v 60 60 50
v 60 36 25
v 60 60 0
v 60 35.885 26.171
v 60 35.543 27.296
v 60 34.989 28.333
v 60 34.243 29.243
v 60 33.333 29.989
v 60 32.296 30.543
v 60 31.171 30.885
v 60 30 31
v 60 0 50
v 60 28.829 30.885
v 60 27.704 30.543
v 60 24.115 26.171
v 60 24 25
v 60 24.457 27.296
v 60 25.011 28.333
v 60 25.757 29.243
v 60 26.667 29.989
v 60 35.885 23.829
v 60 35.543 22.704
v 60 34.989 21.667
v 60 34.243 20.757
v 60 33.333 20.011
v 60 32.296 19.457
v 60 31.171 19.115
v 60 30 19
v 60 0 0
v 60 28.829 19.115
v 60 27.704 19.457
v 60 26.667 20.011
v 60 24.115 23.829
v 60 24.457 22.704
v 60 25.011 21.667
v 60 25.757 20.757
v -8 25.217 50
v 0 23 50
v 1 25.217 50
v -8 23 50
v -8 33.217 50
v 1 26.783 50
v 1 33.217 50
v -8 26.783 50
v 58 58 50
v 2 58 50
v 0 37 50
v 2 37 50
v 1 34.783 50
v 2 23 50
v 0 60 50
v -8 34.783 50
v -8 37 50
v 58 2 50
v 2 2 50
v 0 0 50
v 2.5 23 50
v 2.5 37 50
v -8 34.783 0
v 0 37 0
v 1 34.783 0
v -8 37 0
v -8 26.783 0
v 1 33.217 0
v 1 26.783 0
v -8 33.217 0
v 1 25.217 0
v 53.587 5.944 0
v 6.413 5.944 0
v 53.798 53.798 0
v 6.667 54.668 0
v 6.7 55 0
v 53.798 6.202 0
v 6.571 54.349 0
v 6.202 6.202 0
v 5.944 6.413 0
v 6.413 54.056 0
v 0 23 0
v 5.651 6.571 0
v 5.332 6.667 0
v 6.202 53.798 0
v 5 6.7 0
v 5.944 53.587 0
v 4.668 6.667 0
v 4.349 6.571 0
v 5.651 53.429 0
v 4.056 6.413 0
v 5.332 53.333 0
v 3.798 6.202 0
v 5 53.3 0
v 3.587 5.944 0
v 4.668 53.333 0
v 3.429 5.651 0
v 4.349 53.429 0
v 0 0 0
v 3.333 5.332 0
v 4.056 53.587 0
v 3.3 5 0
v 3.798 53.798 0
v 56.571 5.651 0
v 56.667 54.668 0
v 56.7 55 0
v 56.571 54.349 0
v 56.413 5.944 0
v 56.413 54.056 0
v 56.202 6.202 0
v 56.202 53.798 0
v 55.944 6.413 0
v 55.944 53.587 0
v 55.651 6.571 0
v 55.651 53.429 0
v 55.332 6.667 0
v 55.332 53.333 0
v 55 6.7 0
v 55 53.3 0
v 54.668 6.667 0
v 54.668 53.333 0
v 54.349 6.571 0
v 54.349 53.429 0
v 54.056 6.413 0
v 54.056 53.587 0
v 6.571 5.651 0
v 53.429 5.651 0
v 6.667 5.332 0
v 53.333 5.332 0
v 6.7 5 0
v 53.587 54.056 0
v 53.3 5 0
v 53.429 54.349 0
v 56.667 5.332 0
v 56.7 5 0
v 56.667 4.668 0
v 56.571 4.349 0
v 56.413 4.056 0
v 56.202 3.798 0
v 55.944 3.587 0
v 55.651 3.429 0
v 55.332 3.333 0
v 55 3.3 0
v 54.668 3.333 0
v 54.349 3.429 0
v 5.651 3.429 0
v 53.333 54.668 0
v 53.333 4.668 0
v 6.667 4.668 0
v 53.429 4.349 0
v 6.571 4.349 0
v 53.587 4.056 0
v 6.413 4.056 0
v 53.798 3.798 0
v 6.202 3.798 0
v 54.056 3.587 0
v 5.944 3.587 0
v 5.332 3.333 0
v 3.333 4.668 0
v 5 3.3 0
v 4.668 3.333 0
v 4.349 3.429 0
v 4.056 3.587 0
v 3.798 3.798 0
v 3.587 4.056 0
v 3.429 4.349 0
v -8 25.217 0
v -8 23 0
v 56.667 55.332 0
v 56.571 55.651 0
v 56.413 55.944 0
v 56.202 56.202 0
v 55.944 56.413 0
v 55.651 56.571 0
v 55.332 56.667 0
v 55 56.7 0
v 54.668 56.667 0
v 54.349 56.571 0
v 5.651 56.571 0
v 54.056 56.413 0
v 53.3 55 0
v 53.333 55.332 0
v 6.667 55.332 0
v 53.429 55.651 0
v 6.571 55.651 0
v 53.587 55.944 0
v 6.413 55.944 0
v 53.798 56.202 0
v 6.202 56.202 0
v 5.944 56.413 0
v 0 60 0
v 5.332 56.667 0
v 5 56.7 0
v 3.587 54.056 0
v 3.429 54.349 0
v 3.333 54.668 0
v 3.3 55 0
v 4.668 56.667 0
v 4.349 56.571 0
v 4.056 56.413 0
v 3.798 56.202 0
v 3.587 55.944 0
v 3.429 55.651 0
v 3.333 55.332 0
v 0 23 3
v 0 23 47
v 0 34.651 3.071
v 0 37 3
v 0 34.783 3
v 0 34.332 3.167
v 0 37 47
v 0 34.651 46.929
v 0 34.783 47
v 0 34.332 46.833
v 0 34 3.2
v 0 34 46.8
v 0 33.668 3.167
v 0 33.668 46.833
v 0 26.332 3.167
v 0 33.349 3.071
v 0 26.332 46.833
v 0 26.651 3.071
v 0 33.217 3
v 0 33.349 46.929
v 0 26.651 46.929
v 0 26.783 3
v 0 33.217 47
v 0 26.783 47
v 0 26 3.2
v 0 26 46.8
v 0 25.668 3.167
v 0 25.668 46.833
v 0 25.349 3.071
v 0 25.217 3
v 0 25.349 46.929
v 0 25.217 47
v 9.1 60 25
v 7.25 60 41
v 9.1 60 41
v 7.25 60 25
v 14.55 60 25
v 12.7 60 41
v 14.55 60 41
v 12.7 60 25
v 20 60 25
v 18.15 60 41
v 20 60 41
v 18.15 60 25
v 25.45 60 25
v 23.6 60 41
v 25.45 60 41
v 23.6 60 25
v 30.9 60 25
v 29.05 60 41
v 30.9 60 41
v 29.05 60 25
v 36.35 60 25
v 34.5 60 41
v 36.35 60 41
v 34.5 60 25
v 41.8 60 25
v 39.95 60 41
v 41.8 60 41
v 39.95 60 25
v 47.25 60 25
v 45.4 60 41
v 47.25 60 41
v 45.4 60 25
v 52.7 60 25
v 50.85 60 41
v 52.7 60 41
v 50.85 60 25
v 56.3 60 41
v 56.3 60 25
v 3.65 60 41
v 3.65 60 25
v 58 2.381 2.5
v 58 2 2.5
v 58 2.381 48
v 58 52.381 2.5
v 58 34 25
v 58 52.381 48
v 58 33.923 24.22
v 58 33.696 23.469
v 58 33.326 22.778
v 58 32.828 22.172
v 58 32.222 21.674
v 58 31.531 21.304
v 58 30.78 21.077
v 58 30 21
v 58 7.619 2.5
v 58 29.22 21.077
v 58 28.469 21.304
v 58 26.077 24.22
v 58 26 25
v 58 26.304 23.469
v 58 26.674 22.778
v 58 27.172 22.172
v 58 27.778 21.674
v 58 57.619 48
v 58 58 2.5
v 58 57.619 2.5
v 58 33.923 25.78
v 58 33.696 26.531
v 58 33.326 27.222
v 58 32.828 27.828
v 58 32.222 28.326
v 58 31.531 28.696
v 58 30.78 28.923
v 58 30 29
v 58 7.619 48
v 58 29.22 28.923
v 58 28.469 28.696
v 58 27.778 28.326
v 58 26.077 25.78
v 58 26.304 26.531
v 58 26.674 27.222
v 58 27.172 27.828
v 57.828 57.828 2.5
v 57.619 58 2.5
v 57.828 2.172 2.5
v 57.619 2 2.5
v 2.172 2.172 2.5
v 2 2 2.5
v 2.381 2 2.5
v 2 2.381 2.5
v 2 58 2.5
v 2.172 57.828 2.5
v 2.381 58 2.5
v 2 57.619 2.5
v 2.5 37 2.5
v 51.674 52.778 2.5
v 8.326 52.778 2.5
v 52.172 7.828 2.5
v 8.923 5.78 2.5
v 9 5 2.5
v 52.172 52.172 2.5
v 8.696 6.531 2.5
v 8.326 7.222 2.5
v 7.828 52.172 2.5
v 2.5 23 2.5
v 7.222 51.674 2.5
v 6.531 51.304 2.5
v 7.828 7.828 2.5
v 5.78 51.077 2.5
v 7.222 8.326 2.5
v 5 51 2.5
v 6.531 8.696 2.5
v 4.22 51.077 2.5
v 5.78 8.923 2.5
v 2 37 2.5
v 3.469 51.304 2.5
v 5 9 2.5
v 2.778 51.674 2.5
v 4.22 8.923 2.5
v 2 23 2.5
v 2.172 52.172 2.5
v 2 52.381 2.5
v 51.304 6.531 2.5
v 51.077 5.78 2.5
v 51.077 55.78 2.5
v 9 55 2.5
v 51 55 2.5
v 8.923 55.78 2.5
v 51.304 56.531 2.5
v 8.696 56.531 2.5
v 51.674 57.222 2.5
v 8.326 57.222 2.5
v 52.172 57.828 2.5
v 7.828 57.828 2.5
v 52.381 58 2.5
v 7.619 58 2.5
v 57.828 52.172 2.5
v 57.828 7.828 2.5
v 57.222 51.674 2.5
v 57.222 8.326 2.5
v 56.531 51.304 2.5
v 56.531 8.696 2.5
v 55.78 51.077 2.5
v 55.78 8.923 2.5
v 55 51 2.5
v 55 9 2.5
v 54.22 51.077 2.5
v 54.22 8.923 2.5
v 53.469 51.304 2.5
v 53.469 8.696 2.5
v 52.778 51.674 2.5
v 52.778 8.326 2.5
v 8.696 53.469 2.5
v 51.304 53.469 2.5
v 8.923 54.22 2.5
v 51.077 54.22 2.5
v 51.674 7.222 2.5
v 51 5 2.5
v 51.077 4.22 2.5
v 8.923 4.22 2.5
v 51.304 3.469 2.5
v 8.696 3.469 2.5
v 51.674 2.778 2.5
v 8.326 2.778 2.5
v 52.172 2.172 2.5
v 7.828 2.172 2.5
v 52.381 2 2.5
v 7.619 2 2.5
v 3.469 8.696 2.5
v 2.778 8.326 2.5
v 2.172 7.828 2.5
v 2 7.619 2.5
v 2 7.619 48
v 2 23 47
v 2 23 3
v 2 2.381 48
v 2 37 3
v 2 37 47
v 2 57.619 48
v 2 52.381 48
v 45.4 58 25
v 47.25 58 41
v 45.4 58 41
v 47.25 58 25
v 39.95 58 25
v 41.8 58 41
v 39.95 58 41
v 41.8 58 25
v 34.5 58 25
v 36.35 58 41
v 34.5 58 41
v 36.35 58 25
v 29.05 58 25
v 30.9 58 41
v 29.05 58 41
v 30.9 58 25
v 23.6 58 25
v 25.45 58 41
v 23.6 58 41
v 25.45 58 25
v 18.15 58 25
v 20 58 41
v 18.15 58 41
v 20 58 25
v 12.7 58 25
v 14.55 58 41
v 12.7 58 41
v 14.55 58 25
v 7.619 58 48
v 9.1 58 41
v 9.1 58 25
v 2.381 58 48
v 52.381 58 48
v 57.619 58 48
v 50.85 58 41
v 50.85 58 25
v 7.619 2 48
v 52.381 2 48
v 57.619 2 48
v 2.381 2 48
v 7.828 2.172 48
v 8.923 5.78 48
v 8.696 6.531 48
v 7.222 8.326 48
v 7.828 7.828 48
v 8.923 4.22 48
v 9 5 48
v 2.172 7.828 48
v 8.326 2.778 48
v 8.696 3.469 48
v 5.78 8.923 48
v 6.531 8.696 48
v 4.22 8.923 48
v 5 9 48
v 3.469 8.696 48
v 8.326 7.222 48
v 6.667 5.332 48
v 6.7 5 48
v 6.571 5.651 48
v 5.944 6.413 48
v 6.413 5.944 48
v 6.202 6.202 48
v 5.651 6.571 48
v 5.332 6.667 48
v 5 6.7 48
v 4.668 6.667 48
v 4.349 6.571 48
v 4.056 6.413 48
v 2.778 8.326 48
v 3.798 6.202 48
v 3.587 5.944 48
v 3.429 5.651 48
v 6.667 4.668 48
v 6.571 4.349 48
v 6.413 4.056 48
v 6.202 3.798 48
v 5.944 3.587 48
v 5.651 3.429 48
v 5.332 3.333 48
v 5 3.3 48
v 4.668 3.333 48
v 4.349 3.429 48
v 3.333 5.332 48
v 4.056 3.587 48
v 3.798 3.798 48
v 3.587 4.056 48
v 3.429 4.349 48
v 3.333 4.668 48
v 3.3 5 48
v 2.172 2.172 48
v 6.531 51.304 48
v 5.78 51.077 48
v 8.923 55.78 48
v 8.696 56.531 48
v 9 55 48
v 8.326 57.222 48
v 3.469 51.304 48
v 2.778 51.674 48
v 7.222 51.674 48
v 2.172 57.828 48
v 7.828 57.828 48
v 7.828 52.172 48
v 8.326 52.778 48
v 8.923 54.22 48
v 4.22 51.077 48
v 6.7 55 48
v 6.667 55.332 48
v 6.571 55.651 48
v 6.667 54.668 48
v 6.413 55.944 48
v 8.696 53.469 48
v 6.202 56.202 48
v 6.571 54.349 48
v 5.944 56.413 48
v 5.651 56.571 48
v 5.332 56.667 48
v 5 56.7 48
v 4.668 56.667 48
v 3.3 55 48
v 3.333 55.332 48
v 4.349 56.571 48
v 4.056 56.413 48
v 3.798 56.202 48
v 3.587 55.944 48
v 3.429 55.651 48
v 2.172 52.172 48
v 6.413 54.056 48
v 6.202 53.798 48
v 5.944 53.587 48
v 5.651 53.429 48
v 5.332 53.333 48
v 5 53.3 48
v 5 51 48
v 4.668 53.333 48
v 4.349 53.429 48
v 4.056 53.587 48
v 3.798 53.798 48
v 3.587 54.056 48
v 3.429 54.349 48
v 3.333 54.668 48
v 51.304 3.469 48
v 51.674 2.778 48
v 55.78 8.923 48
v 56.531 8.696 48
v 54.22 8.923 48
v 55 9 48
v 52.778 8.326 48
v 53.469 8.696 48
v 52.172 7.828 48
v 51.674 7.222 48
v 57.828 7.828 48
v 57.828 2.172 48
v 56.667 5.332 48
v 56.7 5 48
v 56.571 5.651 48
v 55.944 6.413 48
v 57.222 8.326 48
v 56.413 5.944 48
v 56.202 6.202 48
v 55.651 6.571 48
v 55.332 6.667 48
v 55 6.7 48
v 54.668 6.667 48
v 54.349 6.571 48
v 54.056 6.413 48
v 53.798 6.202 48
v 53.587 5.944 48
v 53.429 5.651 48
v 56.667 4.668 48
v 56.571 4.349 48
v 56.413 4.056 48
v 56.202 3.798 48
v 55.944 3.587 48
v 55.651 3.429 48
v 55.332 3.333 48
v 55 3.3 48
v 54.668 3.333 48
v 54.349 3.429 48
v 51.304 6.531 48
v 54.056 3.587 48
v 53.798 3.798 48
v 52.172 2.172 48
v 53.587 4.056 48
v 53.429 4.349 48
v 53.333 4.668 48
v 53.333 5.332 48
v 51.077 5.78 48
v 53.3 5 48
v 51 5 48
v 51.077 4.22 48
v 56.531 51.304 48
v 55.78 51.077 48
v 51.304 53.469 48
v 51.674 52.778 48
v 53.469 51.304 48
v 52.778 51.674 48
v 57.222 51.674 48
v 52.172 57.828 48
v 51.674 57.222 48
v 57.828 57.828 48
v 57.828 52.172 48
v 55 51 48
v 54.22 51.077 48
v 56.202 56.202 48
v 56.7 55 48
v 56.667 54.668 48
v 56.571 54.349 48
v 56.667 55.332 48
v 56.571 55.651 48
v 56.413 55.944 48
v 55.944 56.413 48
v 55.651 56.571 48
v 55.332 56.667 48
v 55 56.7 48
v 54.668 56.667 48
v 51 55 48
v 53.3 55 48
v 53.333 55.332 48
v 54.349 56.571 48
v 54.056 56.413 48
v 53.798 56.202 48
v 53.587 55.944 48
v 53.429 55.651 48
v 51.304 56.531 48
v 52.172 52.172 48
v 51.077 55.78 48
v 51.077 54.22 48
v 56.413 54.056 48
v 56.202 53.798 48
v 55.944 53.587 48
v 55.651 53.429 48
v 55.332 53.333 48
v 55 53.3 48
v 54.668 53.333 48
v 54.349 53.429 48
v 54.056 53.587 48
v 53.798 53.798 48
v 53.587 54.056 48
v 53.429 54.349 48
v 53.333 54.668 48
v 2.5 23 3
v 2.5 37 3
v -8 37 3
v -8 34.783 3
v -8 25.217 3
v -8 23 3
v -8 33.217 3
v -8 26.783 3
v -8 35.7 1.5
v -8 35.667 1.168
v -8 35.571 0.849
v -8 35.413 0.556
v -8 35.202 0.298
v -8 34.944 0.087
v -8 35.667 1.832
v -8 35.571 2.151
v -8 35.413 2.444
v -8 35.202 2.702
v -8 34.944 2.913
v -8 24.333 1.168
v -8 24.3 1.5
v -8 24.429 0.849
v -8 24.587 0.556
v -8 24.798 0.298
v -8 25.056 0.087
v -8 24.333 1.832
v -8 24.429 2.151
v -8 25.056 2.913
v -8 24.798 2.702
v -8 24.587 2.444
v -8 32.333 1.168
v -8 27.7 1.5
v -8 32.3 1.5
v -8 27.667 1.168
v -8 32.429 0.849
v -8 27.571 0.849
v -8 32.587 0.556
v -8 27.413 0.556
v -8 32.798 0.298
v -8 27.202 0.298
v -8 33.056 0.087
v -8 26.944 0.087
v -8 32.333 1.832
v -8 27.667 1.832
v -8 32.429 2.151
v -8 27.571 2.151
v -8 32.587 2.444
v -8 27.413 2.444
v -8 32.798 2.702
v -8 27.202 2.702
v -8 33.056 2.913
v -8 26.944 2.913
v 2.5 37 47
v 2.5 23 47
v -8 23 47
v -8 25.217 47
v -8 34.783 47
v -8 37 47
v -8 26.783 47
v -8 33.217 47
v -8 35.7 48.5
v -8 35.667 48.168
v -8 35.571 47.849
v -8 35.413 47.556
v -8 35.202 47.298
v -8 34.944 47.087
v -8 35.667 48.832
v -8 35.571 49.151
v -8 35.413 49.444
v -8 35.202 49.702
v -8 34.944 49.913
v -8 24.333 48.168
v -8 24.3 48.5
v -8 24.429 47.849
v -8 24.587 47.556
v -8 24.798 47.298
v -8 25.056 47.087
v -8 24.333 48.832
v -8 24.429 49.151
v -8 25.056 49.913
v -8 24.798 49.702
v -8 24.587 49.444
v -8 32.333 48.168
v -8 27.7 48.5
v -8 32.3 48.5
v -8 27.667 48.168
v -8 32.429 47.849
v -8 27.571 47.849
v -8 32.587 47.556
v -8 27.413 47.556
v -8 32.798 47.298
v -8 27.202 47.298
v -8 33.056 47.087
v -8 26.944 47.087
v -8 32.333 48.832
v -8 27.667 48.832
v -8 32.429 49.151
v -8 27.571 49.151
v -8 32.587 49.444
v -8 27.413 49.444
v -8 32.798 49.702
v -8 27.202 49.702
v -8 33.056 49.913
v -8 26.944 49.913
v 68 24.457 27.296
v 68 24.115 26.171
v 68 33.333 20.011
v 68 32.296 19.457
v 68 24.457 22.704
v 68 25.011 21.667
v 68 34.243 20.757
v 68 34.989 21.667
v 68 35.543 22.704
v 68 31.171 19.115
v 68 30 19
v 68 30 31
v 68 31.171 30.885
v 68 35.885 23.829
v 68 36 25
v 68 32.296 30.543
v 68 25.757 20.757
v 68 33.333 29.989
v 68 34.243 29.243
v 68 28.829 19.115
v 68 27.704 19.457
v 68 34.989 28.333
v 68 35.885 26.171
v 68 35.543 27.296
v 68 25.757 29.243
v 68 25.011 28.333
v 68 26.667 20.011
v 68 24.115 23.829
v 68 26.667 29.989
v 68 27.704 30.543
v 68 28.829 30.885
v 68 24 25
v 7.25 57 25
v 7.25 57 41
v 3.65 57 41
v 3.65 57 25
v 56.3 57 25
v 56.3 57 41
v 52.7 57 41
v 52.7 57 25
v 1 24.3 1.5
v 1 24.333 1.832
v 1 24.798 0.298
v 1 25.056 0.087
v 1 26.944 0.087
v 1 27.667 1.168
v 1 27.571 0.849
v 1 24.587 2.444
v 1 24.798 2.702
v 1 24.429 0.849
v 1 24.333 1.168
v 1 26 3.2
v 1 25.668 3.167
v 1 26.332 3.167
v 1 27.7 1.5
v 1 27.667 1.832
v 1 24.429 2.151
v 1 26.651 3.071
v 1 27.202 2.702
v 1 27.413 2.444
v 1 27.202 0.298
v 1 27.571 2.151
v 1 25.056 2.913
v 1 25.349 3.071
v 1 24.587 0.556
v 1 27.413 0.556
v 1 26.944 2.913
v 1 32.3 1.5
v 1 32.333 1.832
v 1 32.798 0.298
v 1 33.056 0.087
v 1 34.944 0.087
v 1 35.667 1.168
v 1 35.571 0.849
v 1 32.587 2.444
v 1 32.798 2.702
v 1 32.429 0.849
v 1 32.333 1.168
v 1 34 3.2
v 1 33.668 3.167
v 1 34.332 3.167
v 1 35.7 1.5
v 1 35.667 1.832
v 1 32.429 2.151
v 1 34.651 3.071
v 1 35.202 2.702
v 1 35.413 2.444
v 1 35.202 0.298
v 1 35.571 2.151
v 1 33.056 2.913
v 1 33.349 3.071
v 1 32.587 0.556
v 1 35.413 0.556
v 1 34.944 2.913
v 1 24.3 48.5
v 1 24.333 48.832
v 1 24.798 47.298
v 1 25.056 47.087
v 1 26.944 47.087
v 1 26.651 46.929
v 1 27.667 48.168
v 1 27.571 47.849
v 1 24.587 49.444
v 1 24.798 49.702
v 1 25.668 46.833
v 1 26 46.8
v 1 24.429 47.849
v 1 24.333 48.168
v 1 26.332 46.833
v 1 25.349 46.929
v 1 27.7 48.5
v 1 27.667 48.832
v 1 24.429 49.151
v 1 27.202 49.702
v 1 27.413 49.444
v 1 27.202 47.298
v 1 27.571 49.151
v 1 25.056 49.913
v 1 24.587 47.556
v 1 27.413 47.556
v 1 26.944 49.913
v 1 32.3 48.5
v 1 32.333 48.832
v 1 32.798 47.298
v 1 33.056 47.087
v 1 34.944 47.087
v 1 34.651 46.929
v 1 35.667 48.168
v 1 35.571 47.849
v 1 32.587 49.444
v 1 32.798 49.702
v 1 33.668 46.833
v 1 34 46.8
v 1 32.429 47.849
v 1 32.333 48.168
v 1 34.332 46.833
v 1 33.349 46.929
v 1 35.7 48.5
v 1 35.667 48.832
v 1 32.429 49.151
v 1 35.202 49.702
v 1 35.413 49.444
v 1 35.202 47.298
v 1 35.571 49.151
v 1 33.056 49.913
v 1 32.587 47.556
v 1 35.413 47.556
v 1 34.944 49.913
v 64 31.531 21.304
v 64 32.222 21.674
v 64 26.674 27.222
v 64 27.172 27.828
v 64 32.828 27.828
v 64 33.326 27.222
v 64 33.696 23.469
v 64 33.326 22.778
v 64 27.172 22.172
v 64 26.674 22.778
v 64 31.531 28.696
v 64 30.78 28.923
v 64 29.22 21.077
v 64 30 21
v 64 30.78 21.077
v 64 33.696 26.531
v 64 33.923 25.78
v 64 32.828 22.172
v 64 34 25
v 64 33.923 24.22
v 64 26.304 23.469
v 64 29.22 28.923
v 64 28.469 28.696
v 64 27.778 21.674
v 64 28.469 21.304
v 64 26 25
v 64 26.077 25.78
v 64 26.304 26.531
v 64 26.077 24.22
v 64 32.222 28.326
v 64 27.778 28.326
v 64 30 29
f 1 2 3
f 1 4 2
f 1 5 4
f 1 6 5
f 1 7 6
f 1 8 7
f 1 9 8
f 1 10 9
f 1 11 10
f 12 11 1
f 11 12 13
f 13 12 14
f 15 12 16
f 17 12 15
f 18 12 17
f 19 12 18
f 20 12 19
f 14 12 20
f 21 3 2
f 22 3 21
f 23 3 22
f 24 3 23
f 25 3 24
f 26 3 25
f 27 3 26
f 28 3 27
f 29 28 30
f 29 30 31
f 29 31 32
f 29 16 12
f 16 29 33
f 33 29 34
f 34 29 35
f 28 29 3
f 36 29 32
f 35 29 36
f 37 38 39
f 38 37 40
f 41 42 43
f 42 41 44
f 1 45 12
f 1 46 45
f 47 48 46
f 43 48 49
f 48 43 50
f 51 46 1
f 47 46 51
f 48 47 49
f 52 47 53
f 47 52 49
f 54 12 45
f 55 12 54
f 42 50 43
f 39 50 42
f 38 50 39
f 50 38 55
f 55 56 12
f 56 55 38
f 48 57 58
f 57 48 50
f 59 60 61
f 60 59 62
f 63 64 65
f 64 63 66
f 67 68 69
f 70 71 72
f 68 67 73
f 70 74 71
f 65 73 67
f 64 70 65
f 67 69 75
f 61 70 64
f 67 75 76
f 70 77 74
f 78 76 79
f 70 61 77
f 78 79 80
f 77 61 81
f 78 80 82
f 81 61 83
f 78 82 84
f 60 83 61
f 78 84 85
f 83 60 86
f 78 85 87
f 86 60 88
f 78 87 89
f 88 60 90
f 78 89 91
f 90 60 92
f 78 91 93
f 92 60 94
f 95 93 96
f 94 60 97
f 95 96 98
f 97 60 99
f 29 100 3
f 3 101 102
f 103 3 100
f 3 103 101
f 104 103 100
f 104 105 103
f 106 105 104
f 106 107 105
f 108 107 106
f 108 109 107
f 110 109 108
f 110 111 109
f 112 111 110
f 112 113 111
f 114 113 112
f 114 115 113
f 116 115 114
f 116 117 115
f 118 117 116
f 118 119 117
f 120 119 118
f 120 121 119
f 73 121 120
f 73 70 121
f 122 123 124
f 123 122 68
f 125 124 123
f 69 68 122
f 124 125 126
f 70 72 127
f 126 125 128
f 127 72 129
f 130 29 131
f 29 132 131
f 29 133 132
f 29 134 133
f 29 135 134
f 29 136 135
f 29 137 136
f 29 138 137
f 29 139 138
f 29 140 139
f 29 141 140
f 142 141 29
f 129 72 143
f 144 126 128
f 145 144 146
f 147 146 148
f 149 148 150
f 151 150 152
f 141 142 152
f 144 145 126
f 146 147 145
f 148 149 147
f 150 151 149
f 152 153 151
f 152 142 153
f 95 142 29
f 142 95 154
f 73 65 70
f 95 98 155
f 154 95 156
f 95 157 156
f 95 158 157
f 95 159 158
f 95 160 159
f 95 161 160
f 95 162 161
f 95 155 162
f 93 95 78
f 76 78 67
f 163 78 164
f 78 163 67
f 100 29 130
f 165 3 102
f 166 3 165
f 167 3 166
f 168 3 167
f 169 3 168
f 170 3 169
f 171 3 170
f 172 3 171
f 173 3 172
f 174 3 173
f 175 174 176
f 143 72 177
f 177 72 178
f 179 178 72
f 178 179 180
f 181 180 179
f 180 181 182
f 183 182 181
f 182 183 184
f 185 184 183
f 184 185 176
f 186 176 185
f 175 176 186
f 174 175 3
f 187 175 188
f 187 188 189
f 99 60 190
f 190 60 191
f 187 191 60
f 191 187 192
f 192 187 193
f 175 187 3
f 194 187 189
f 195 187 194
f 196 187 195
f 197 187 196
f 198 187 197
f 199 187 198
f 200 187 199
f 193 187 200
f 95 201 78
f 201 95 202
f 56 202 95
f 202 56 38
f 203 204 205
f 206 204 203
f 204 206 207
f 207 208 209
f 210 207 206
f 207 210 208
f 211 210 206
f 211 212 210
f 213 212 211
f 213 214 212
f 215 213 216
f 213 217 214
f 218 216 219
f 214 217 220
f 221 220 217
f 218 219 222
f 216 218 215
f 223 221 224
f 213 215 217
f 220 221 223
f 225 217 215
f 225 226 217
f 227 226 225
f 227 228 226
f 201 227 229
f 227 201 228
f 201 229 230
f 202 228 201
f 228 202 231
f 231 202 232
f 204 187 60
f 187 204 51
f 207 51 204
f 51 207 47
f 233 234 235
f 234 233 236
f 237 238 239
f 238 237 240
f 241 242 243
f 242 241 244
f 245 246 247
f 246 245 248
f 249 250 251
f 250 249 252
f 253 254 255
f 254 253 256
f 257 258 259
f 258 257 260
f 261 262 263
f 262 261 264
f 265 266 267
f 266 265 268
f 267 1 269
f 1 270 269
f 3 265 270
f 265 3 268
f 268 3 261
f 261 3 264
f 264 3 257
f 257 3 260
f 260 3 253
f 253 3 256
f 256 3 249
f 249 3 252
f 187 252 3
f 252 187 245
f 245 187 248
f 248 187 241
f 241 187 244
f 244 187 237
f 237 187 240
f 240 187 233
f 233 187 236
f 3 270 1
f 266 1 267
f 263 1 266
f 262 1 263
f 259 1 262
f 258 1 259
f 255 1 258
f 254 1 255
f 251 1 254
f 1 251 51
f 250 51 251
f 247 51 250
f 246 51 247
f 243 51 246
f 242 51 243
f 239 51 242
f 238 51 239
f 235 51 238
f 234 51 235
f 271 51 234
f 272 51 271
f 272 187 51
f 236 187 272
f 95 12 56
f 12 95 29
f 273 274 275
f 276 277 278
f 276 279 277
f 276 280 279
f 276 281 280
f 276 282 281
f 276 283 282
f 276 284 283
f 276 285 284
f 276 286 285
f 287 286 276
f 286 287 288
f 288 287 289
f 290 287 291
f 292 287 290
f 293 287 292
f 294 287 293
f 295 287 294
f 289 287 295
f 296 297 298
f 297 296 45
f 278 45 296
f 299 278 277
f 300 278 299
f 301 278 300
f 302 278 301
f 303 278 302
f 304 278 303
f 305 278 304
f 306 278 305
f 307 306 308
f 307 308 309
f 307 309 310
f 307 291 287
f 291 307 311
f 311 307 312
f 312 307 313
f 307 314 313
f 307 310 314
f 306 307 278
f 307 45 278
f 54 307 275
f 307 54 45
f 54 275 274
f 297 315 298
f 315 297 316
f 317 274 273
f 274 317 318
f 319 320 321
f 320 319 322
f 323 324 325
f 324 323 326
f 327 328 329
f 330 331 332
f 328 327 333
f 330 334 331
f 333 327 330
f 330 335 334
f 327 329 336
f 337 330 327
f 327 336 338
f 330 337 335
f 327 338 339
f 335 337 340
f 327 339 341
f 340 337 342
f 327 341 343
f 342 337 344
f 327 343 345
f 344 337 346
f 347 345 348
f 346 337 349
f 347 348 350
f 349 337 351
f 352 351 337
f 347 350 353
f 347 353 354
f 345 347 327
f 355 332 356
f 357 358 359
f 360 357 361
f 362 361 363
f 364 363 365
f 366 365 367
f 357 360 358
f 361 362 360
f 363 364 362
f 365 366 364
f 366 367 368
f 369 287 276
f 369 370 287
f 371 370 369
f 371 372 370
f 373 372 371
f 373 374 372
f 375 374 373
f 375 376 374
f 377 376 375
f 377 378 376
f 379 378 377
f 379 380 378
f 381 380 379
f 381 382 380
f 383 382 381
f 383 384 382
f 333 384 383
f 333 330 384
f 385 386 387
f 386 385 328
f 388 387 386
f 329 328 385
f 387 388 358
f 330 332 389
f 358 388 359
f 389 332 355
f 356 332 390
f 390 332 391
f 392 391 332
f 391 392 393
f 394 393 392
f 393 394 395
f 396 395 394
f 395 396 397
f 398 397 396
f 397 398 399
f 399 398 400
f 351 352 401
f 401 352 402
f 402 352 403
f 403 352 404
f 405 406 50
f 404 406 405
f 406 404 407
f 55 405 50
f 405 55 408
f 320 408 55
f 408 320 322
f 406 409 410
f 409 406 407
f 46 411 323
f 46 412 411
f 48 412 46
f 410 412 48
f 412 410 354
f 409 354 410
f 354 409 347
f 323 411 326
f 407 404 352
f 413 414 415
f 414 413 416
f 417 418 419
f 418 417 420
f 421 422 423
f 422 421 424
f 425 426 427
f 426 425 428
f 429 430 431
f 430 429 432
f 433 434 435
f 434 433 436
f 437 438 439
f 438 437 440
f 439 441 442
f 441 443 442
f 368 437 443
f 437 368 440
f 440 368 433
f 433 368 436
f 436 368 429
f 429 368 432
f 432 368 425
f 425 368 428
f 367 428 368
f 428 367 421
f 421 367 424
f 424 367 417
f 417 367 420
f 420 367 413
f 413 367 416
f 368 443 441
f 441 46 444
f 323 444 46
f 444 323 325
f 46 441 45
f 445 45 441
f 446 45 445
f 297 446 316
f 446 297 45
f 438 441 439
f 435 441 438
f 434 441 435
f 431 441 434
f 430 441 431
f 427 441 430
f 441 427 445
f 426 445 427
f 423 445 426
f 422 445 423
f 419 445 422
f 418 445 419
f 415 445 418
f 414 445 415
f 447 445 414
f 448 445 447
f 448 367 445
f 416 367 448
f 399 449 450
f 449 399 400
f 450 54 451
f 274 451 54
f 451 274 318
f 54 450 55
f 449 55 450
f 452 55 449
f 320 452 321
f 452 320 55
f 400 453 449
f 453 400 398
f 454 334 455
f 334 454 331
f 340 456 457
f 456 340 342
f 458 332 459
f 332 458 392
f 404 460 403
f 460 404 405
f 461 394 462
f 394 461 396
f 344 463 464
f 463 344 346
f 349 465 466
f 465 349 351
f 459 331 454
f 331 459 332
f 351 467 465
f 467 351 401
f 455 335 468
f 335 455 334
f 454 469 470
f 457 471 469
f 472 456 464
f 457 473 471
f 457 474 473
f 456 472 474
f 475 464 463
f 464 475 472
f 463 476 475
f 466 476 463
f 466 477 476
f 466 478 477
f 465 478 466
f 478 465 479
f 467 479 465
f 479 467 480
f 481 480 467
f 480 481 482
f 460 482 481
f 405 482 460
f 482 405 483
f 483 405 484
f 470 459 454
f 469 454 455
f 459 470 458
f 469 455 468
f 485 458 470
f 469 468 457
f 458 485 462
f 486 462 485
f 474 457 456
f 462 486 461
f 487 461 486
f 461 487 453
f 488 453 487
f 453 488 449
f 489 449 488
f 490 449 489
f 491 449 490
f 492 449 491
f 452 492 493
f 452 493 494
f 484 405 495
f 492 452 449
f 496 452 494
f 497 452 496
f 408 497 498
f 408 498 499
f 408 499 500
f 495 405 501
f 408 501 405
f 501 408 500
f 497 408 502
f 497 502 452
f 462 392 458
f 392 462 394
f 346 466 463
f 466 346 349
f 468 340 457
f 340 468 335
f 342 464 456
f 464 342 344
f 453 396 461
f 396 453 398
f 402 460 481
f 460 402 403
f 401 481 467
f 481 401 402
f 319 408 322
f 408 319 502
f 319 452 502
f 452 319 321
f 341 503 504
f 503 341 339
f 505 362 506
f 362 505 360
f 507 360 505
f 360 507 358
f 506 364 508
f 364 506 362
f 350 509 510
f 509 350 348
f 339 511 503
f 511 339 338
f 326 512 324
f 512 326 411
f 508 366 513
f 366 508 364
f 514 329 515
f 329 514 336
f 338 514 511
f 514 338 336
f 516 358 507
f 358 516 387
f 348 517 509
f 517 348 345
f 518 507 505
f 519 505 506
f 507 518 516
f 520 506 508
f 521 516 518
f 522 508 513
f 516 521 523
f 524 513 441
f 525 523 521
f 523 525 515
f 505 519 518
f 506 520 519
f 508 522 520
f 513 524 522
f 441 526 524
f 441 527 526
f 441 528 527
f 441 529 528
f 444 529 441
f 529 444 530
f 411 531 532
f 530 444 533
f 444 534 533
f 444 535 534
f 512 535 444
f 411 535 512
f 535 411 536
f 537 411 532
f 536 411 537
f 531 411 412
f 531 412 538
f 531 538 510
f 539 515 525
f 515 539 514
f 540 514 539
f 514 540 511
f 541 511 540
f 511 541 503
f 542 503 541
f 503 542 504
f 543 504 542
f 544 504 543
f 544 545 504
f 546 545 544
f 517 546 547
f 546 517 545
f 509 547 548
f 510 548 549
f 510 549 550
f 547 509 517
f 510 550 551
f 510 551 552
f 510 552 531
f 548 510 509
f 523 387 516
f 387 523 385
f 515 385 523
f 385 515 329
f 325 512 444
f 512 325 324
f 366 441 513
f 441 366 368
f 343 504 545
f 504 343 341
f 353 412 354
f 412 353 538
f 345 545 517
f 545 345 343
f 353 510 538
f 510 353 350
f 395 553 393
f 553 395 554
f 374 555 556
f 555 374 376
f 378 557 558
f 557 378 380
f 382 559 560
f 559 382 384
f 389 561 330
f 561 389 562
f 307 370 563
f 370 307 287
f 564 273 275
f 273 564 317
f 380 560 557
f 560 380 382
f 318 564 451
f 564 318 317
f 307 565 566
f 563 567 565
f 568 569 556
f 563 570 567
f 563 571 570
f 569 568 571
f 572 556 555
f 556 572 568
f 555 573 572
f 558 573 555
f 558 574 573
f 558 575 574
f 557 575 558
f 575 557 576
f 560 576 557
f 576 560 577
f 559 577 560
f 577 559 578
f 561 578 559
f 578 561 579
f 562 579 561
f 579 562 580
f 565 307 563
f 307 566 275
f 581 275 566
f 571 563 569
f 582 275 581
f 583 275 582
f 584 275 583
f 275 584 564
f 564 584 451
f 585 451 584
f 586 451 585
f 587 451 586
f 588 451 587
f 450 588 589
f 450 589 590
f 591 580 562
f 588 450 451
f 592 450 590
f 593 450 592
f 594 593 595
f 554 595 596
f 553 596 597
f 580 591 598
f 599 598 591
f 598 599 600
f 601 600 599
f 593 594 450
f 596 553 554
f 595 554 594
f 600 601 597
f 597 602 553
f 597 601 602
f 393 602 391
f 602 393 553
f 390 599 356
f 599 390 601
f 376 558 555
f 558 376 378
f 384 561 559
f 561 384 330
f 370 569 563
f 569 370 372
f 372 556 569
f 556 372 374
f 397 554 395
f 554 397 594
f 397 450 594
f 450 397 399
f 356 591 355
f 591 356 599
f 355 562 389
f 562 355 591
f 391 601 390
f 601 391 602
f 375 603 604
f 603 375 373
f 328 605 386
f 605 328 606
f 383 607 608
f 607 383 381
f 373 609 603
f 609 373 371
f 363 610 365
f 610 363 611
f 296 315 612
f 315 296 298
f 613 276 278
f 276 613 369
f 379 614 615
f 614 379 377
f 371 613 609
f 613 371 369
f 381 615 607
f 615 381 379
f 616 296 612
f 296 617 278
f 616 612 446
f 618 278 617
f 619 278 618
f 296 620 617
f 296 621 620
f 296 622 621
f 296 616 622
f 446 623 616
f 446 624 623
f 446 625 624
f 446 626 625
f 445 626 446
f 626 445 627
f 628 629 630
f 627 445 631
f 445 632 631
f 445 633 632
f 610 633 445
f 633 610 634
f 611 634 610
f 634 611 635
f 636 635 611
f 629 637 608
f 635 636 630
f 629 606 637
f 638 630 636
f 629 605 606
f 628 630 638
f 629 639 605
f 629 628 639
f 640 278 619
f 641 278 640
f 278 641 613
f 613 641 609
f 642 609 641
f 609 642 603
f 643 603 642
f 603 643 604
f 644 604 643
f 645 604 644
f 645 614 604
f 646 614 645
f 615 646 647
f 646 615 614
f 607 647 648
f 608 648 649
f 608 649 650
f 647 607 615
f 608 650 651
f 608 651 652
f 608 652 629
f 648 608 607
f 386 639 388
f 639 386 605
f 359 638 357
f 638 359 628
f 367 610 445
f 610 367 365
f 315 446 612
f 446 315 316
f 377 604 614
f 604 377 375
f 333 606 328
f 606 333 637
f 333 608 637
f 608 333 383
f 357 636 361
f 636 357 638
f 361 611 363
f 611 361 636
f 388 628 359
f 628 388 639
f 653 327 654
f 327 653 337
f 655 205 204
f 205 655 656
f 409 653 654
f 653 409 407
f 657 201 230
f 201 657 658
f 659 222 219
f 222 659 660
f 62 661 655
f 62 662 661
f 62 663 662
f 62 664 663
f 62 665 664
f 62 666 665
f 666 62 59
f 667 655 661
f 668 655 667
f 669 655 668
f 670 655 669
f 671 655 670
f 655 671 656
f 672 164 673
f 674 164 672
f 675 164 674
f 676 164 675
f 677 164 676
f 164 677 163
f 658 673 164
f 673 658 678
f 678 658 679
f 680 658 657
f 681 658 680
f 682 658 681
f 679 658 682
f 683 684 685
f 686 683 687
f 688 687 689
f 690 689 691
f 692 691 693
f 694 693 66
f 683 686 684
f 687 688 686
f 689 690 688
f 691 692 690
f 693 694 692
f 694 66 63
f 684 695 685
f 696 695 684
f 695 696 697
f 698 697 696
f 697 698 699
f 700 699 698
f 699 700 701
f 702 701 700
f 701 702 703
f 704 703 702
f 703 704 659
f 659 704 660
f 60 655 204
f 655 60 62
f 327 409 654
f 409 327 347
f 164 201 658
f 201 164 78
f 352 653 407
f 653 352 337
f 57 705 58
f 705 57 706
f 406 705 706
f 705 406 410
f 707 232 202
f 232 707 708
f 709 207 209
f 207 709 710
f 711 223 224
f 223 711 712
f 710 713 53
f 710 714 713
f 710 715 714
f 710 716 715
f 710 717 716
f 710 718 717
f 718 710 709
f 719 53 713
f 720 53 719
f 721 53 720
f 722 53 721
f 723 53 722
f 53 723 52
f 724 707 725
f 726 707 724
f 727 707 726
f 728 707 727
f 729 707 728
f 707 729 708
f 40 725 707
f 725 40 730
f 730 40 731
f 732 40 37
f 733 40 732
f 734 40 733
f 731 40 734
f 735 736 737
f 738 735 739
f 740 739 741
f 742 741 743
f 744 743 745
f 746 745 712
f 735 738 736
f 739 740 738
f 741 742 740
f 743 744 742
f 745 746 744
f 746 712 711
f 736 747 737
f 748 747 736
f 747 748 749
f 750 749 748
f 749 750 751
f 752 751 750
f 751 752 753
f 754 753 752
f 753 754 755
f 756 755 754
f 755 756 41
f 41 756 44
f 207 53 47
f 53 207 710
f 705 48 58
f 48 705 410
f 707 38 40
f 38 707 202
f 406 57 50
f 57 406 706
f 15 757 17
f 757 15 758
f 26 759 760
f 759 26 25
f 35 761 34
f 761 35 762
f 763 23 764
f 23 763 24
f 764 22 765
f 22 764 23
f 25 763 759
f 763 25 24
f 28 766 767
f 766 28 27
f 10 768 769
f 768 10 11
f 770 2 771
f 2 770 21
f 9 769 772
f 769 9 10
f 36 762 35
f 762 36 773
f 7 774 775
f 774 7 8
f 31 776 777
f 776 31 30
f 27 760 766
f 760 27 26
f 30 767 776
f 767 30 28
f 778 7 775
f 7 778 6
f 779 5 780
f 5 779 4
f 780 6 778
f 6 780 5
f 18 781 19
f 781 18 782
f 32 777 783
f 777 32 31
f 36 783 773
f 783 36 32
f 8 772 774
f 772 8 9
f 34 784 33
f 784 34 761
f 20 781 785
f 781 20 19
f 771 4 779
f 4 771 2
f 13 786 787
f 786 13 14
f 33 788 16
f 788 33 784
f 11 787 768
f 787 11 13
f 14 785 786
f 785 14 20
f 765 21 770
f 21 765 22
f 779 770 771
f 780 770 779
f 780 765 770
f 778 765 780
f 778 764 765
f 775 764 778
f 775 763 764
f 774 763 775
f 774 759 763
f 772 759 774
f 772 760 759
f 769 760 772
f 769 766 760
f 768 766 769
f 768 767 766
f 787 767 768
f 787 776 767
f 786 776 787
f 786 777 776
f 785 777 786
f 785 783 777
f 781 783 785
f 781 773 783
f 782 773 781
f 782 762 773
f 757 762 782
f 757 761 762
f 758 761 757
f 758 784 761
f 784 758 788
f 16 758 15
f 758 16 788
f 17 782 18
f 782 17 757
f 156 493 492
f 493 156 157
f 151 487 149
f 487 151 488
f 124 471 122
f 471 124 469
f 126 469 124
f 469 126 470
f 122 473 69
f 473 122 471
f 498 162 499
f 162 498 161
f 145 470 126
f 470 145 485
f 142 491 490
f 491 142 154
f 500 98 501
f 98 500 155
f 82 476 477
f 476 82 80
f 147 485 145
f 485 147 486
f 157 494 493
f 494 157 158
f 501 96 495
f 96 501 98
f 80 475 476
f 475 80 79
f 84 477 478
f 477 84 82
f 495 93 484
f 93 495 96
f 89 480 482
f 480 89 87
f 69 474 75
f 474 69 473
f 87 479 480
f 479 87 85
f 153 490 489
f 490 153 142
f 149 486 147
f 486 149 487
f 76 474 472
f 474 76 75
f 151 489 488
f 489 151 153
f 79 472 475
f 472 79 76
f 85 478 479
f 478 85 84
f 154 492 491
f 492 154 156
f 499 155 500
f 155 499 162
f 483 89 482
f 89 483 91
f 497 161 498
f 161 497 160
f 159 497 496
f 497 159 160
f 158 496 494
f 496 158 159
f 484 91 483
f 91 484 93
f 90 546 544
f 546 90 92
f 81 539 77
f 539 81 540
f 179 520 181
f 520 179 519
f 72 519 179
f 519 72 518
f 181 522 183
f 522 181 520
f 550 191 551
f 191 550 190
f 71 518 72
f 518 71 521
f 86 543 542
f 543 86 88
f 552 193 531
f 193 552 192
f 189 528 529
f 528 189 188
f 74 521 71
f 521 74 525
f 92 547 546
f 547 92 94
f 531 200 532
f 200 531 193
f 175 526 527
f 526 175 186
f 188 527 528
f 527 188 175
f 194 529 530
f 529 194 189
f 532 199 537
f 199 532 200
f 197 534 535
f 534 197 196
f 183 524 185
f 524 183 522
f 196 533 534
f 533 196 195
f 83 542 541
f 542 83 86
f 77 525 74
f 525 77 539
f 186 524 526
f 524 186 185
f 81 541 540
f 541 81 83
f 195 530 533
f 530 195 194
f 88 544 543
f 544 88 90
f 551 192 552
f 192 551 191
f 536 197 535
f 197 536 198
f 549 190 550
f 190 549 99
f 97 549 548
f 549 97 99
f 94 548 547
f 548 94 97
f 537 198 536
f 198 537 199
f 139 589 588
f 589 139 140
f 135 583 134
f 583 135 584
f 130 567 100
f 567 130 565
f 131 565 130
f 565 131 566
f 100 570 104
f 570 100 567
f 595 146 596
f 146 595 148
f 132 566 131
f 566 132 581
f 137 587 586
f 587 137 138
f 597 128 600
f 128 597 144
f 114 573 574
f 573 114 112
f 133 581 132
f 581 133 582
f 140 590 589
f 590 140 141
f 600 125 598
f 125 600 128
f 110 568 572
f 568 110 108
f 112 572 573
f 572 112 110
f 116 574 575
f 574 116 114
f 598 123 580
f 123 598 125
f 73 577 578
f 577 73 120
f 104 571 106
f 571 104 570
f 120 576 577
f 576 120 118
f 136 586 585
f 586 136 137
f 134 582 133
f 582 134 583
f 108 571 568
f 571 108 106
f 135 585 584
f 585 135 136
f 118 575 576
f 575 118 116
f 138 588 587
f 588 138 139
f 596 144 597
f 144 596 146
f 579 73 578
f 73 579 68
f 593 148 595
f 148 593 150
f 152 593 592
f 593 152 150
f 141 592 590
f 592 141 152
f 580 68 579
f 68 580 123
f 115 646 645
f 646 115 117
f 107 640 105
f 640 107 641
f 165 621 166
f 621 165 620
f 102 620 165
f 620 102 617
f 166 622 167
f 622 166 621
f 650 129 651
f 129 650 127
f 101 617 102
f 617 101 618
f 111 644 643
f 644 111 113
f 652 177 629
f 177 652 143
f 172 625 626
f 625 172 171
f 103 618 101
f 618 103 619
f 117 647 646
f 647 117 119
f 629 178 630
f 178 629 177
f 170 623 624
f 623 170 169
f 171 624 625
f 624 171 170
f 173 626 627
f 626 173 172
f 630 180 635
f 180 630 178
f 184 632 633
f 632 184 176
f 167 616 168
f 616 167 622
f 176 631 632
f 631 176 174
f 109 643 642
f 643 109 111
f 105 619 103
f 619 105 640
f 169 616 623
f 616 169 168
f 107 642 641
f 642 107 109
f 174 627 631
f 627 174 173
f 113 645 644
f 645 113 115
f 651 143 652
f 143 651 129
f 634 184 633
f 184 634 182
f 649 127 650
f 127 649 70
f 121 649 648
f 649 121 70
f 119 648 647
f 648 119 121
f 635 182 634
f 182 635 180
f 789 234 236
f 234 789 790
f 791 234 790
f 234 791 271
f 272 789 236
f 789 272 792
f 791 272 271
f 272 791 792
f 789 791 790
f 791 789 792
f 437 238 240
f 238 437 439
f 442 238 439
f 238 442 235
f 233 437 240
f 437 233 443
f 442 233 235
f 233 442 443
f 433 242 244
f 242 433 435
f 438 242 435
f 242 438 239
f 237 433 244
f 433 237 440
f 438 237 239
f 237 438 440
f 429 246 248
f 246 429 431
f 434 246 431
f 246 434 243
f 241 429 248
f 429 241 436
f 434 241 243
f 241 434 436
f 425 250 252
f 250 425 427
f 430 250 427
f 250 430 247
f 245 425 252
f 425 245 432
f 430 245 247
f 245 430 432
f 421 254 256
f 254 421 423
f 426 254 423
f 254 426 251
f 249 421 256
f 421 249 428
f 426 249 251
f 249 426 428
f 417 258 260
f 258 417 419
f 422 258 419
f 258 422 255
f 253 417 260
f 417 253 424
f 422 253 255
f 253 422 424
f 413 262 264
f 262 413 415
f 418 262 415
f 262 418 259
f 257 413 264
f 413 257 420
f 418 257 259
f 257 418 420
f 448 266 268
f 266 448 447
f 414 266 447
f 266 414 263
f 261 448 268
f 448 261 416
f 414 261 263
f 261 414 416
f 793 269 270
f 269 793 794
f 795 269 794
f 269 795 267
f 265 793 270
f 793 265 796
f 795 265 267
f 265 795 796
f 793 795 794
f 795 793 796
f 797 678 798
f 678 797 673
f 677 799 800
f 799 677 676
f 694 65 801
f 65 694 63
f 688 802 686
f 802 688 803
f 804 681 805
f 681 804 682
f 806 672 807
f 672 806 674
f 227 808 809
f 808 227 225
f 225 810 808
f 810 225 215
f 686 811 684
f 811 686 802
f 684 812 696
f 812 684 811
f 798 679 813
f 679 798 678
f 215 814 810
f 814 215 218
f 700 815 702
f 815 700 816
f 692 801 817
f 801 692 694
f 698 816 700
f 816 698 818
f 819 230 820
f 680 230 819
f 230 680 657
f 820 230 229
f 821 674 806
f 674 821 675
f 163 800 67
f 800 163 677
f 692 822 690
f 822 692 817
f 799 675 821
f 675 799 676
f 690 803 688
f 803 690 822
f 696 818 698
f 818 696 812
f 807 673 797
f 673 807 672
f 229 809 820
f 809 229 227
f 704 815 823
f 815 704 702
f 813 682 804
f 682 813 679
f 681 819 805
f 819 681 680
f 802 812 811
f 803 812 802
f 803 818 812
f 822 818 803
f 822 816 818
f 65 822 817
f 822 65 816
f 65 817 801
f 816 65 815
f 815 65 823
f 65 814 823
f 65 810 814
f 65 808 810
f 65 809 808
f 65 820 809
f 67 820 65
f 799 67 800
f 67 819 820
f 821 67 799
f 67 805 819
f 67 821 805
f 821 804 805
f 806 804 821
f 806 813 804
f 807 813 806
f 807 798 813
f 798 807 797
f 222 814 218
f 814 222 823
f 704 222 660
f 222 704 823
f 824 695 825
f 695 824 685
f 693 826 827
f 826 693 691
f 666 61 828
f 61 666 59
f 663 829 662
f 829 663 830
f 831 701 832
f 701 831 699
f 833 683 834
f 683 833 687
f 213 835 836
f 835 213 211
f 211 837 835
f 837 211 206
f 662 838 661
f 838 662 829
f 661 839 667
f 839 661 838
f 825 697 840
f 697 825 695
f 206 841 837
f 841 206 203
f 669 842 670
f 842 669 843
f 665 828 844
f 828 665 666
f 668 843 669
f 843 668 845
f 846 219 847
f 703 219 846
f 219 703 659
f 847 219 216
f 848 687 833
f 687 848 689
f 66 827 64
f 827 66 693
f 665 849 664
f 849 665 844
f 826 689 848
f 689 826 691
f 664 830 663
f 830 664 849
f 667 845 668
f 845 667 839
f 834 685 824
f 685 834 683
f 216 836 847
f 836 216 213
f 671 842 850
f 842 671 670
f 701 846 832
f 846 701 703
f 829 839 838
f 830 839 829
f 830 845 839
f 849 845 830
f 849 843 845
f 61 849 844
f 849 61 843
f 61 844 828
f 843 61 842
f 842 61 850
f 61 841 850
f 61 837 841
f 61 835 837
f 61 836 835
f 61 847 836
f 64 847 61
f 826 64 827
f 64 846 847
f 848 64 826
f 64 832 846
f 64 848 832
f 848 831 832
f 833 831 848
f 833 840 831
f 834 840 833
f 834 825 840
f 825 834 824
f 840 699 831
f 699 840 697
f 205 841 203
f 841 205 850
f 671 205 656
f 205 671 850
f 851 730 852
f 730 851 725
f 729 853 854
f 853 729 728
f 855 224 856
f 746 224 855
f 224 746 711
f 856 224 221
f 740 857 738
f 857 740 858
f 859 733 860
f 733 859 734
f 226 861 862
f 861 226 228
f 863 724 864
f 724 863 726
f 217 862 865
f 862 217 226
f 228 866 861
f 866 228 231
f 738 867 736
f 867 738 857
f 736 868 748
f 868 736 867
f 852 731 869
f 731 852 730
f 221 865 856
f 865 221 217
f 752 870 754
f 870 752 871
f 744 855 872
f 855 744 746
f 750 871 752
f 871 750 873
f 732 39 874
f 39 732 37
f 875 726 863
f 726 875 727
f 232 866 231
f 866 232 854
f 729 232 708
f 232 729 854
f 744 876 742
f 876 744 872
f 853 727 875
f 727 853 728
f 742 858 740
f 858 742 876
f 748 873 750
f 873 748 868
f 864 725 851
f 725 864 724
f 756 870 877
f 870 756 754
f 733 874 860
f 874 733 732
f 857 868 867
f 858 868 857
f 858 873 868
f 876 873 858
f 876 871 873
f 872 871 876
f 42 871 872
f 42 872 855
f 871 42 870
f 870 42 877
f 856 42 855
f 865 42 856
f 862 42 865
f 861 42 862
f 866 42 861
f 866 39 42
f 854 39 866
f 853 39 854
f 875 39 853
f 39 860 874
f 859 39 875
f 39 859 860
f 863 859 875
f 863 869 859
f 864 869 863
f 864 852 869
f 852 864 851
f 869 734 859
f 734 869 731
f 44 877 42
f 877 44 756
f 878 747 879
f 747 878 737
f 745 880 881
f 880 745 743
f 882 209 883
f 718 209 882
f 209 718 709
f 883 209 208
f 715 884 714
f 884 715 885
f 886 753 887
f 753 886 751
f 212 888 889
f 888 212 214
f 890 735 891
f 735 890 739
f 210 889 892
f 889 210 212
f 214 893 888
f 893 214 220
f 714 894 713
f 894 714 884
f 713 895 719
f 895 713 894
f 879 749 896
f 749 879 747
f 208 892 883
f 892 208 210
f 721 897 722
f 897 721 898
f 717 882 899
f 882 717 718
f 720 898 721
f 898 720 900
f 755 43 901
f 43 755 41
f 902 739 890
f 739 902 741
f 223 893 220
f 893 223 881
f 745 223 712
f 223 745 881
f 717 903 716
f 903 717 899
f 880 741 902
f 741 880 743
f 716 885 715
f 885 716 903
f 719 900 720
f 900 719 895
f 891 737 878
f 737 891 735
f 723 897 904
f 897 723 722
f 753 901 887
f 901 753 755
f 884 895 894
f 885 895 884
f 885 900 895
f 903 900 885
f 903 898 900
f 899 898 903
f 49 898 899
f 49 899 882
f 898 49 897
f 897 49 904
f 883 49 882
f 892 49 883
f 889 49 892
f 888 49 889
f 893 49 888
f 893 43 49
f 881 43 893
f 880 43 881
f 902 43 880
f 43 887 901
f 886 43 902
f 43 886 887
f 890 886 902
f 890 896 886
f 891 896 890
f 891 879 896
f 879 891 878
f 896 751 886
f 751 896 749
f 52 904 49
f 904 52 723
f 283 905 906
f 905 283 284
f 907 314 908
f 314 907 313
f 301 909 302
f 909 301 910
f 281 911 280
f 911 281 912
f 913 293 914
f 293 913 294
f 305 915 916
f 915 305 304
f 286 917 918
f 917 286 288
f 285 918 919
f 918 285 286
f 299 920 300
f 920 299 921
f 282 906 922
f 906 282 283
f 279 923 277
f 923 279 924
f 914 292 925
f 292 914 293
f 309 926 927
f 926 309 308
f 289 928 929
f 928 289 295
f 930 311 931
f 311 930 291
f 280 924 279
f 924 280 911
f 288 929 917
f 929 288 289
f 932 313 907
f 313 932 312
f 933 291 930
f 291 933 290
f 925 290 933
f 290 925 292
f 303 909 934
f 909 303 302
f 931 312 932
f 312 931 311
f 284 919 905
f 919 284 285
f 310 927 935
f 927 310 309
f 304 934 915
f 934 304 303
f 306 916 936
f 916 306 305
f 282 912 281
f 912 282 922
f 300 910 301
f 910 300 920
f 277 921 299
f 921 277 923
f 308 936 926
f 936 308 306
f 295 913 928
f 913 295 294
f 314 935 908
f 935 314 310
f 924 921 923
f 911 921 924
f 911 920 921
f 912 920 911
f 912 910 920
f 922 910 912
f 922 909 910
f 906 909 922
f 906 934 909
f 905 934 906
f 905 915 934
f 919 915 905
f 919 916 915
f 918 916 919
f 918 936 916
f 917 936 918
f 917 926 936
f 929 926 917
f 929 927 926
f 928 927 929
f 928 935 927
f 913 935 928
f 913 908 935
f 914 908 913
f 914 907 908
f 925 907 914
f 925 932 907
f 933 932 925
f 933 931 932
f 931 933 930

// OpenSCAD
$fn = 32;

// ----------------------------------------------------------------------
// Enclosure body: 60 x 60 x 50 mm, wall 2 mm
// ----------------------------------------------------------------------

// --- parameters (mm) ---
length = 60;              // outside length, X
width = 60;               // outside width, Y
height = 50;              // outside height, Z
wall = 2;                 // side wall thickness
floor_t = 2.5;            // floor thickness
boss_d = 8;               // corner boss diameter
boss_h = 45.5;            // corner boss height above the floor
boss_hole_d = 3.4;        // lid screw clearance in the boss
boss_lip = 5;             // boss centre inset from the corner
ear_w = 14;               // mounting ear width
ear_t = 3;                // mounting ear thickness
ear_ext = 8;              // mounting ear reach
ear_hole_d = 3.4;         // mounting ear drills
vent_slots = 10;          // vent slots in the long wall
vent_w = 3.6;             // vent slot width
vent_h = 16;              // vent slot height
vent_pitch = 5.45;        // vent slot pitch
vent_z = 25;              // vent slot sill height
nipple_d = 12;            // cable gland boss diameter
nipple_h = 8;             // cable gland boss height
nipple_bore = 8;          // cable gland bore

module shell() {
  difference() {
    cube([length, width, height]);
    /* hollow, open at the top */
    translate([wall, wall, floor_t])
      cube([length - 2 * wall, width - 2 * wall, height]);
  }
}

module bosses() {
  /* corner bosses, sunk 1 mm into the floor */
  for (sx = [0, 1]) for (sy = [0, 1])
    translate([sx * (length - 2 * boss_lip) + boss_lip, sy * (width - 2 * boss_lip) + boss_lip, floor_t - 1])
      cylinder(h = boss_h + 1, d = boss_d);
}

module gland() {
  /* boss on the short wall, sunk 1 mm into it */
  translate([length - 1, width / 2, height * 0.5]) rotate([0, 90, 0])
    cylinder(h = nipple_h + 1, d = nipple_d);
}

module ears() {
  /* mounting ears on the short walls, sunk into the wall */
  for (sz = [0, 1])
    translate([-ear_ext, width / 2 - ear_w / 2, sz * (height - ear_t)])
      cube([ear_ext + 2.5, ear_w, ear_t]);
}

difference() {
  union() {
    shell();
    bosses();
    gland();
    ears();
  }
  /* boss screw holes */
  for (sx = [0, 1]) for (sy = [0, 1])
    translate([sx * (length - 2 * boss_lip) + boss_lip, sy * (width - 2 * boss_lip) + boss_lip, -1]) cylinder(h = floor_t + boss_h + 2, d = boss_hole_d);
  /* vent grille in the +Y wall */
  for (i = [0 : vent_slots - 1]) translate([vent_pitch * (i + 1) - vent_w / 2, width - wall - 1, vent_z]) cube([vent_w, wall + 2, vent_h]);
  translate([length, width / 2, height * 0.5]) rotate([0, 90, 0]) translate([0, 0, -nipple_h - 2]) cylinder(h = nipple_h + wall + 4, d = nipple_bore);
  for (sz = [0, 1]) for (sx = [0, 1]) translate([-ear_ext - 1, width / 2 + (2 * sx - 1) * (ear_w / 2 - 3), sz * (height - ear_t) + ear_t / 2]) rotate([0, 90, 0]) cylinder(h = ear_ext + 2, d = ear_hole_d);
}
